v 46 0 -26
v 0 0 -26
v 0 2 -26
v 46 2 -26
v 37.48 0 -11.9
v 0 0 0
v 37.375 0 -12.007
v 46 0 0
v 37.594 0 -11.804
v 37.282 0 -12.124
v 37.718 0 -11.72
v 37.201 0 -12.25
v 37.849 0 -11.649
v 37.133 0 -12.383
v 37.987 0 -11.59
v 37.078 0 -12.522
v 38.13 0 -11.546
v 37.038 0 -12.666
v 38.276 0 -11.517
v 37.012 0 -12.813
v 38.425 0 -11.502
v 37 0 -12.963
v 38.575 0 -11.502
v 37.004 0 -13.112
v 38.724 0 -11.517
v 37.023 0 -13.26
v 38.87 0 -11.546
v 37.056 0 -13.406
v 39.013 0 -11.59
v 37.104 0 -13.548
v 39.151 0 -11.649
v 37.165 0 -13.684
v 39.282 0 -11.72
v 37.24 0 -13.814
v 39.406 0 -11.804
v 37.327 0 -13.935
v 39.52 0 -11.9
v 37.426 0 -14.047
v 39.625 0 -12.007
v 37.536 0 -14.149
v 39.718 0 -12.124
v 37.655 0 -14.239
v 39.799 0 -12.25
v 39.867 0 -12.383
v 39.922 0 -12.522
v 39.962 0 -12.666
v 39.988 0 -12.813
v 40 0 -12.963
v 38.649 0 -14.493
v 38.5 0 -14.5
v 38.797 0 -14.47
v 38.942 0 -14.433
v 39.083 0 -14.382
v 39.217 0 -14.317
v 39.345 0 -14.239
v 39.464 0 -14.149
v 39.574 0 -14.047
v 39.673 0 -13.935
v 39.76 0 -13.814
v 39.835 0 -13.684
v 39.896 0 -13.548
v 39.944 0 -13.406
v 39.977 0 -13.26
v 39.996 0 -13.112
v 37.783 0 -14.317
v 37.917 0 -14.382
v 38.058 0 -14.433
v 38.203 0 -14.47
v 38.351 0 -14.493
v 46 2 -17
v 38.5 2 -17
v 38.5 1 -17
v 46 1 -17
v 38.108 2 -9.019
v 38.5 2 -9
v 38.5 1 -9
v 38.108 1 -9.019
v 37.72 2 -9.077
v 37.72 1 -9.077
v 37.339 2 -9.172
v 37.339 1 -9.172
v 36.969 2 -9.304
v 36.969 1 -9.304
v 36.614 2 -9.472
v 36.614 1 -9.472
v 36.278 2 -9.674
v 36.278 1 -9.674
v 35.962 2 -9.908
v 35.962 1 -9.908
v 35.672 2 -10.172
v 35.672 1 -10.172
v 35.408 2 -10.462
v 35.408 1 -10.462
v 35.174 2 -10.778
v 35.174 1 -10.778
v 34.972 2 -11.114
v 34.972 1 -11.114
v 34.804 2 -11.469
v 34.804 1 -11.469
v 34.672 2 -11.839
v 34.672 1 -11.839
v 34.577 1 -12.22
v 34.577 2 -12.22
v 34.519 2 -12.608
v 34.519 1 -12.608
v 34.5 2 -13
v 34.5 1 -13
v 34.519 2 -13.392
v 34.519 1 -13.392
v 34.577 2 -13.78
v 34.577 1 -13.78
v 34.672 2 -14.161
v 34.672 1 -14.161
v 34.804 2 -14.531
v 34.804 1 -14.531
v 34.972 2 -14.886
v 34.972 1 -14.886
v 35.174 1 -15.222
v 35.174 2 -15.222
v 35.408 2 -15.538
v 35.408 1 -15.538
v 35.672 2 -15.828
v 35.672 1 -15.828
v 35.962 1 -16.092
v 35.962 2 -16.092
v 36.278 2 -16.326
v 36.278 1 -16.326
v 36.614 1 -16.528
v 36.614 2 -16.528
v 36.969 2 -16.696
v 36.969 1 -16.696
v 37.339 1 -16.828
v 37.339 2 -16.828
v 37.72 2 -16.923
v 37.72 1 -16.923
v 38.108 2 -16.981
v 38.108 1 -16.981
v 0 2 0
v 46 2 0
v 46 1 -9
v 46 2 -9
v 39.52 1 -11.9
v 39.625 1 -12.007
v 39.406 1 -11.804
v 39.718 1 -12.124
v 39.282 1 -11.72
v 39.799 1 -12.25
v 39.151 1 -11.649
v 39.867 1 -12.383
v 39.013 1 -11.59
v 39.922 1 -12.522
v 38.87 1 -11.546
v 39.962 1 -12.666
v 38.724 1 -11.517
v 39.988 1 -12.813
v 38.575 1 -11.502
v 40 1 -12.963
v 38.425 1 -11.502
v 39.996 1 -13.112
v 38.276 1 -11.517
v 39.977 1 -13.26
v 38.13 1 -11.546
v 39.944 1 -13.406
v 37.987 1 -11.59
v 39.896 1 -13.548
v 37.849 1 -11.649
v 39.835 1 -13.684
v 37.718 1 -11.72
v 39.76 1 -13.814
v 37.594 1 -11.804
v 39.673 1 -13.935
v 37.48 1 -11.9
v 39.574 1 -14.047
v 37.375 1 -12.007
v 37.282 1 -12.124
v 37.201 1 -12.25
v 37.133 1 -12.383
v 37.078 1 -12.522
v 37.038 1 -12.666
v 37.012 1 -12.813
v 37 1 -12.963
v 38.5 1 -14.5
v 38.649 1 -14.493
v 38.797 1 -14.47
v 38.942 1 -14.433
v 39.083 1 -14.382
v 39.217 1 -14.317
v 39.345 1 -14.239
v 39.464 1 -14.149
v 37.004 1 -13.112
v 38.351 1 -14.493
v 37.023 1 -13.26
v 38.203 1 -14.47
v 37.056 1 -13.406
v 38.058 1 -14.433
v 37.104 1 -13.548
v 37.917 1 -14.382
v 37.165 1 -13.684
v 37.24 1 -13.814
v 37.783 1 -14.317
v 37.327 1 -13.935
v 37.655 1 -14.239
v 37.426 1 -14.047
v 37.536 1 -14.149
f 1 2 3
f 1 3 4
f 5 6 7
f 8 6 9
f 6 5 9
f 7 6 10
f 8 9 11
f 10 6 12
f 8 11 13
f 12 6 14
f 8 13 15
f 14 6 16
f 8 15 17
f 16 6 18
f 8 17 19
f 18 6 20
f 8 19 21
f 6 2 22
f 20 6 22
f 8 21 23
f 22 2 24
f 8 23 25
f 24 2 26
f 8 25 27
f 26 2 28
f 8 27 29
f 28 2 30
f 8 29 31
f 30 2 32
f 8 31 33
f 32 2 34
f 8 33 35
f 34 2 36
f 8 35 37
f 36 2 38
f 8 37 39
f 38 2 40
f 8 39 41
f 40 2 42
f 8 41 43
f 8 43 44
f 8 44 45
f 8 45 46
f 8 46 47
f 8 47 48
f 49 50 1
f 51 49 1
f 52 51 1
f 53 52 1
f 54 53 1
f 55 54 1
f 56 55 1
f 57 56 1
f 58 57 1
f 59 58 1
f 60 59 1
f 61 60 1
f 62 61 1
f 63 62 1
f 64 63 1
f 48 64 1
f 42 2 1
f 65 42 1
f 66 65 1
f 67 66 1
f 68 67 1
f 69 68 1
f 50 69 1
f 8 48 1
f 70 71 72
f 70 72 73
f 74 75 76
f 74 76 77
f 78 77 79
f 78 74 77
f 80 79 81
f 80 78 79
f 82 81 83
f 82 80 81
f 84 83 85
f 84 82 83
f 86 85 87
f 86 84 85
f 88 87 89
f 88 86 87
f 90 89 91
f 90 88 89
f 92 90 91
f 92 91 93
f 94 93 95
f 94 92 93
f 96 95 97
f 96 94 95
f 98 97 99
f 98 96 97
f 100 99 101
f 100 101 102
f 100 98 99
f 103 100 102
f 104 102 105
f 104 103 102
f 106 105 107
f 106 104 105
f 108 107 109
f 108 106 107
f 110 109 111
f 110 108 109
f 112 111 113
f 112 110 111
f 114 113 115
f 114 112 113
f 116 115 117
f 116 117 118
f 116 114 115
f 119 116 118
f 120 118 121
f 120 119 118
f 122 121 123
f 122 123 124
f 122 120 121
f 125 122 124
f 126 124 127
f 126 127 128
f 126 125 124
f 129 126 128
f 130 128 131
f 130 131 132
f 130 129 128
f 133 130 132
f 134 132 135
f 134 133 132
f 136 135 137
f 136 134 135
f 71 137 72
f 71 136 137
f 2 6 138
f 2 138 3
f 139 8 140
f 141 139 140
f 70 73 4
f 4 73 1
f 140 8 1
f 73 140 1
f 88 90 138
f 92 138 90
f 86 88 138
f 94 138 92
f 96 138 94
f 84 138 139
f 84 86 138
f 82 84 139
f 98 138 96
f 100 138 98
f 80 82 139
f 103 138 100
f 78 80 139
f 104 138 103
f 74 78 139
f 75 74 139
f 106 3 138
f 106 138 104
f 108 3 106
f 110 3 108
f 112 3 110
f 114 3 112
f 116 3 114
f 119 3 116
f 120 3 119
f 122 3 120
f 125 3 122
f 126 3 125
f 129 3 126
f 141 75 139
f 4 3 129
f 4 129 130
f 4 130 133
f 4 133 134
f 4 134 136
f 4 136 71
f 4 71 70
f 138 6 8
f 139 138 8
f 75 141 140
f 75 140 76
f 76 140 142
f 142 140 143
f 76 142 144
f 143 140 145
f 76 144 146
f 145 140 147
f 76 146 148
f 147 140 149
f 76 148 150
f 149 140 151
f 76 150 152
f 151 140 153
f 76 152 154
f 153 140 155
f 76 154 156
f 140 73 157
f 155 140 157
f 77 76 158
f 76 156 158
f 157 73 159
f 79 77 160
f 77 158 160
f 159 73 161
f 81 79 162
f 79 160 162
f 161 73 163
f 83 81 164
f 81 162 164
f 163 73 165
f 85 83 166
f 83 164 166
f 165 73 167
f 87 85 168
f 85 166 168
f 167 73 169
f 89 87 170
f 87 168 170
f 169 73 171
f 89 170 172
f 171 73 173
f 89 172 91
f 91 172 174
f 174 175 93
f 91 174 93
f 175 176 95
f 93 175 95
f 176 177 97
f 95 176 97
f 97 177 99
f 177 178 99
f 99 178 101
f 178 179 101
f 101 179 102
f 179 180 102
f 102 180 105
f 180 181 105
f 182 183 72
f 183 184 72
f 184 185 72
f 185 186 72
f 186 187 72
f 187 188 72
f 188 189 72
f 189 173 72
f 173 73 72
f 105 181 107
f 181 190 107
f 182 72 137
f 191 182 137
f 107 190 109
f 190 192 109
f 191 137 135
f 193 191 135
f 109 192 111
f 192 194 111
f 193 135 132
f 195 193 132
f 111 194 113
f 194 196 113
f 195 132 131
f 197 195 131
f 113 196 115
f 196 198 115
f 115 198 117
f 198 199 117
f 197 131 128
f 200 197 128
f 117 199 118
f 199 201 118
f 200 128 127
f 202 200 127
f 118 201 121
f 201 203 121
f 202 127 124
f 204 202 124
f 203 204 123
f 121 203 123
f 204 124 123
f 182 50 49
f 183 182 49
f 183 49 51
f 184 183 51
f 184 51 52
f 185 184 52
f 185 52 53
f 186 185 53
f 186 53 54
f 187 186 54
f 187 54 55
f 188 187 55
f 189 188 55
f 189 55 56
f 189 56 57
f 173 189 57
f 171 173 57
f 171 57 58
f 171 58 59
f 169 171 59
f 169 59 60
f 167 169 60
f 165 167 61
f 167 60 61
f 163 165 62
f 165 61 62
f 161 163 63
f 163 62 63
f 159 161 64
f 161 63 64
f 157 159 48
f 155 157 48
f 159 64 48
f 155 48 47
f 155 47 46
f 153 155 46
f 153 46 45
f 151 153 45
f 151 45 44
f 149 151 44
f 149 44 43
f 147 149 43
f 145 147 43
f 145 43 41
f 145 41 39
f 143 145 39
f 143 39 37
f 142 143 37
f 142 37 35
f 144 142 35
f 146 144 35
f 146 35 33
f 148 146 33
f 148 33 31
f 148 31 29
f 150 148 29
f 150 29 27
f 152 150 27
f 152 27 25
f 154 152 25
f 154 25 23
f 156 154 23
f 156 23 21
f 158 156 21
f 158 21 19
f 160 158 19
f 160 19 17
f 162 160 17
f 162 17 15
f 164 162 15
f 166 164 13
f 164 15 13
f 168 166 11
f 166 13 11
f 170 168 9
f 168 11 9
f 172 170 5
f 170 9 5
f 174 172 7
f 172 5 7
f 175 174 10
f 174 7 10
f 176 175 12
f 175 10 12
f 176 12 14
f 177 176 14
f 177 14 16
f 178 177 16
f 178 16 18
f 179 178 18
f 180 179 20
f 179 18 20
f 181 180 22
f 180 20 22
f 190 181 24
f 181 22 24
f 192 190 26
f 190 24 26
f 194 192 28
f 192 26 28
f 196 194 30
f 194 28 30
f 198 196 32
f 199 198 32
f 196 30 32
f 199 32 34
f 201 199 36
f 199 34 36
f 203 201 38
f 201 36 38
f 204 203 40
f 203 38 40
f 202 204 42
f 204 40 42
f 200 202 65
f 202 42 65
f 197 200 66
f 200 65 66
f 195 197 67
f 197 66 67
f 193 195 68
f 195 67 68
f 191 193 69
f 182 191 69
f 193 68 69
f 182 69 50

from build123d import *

# Parameters (mm, degrees)
SKETCH1_W                           = 46
SKETCH1_H                           = 26
BOSS_EXTRUDE1_DEPTH                 = 2
CUT_EXTRUDE1_DEPTH                  = 1
F_3_0MM_DOWEL_HOLE1_D               = 3
F_3_0MM_DOWEL_HOLE1_DEPTH           = 1
F_3_0MM_DOWEL_HOLE1_ON_FACE_2_D     = 3
F_3_0MM_DOWEL_HOLE1_ON_FACE_2_DEPTH = 1


with BuildPart() as part:
    # Sketch1 → Boss-Extrude1 (new body)
    with BuildSketch(Plane(origin=(0, 0, 0), x_dir=(1, 0, 0), z_dir=(0, 1, 0))):
        with Locations((23, 13)):
            Rectangle(SKETCH1_W, SKETCH1_H)
    extrude(amount=BOSS_EXTRUDE1_DEPTH)

    # Sketch2 → Cut-Extrude1 (cut)
    with BuildSketch(Plane(origin=(0, 2, 0), x_dir=(1, 0, 0), z_dir=(0, 1, 0))):
        with BuildLine():
            Line((38.5, 17), (53.5, 17))
            ThreePointArc((53.5, 17), (57.5, 13), (53.5, 9))
            Line((53.5, 9), (38.5, 9))
            ThreePointArc((38.5, 9), (34.5, 13), (38.5, 17))
        make_face()
    extrude(amount=-CUT_EXTRUDE1_DEPTH, mode=Mode.SUBTRACT)

    # Ø3.0mm Dowel Hole1
    with Locations(Plane(origin=(38.5, 1, -13), x_dir=(0, 0, 1), z_dir=(0, 1, 0))):
        with Locations((0, 0)):
            Hole(F_3_0MM_DOWEL_HOLE1_D / 2, depth=F_3_0MM_DOWEL_HOLE1_DEPTH)

    # Ø3.0mm Dowel Hole1 on face 2
    with Locations(Plane(origin=(65.15789834, 32.144542586, 0), x_dir=(0, 0, 1), z_dir=(0, 1, 0))):
        with Locations((0, 0)):
            Hole(F_3_0MM_DOWEL_HOLE1_ON_FACE_2_D / 2, depth=F_3_0MM_DOWEL_HOLE1_ON_FACE_2_DEPTH)


solid = part.part
